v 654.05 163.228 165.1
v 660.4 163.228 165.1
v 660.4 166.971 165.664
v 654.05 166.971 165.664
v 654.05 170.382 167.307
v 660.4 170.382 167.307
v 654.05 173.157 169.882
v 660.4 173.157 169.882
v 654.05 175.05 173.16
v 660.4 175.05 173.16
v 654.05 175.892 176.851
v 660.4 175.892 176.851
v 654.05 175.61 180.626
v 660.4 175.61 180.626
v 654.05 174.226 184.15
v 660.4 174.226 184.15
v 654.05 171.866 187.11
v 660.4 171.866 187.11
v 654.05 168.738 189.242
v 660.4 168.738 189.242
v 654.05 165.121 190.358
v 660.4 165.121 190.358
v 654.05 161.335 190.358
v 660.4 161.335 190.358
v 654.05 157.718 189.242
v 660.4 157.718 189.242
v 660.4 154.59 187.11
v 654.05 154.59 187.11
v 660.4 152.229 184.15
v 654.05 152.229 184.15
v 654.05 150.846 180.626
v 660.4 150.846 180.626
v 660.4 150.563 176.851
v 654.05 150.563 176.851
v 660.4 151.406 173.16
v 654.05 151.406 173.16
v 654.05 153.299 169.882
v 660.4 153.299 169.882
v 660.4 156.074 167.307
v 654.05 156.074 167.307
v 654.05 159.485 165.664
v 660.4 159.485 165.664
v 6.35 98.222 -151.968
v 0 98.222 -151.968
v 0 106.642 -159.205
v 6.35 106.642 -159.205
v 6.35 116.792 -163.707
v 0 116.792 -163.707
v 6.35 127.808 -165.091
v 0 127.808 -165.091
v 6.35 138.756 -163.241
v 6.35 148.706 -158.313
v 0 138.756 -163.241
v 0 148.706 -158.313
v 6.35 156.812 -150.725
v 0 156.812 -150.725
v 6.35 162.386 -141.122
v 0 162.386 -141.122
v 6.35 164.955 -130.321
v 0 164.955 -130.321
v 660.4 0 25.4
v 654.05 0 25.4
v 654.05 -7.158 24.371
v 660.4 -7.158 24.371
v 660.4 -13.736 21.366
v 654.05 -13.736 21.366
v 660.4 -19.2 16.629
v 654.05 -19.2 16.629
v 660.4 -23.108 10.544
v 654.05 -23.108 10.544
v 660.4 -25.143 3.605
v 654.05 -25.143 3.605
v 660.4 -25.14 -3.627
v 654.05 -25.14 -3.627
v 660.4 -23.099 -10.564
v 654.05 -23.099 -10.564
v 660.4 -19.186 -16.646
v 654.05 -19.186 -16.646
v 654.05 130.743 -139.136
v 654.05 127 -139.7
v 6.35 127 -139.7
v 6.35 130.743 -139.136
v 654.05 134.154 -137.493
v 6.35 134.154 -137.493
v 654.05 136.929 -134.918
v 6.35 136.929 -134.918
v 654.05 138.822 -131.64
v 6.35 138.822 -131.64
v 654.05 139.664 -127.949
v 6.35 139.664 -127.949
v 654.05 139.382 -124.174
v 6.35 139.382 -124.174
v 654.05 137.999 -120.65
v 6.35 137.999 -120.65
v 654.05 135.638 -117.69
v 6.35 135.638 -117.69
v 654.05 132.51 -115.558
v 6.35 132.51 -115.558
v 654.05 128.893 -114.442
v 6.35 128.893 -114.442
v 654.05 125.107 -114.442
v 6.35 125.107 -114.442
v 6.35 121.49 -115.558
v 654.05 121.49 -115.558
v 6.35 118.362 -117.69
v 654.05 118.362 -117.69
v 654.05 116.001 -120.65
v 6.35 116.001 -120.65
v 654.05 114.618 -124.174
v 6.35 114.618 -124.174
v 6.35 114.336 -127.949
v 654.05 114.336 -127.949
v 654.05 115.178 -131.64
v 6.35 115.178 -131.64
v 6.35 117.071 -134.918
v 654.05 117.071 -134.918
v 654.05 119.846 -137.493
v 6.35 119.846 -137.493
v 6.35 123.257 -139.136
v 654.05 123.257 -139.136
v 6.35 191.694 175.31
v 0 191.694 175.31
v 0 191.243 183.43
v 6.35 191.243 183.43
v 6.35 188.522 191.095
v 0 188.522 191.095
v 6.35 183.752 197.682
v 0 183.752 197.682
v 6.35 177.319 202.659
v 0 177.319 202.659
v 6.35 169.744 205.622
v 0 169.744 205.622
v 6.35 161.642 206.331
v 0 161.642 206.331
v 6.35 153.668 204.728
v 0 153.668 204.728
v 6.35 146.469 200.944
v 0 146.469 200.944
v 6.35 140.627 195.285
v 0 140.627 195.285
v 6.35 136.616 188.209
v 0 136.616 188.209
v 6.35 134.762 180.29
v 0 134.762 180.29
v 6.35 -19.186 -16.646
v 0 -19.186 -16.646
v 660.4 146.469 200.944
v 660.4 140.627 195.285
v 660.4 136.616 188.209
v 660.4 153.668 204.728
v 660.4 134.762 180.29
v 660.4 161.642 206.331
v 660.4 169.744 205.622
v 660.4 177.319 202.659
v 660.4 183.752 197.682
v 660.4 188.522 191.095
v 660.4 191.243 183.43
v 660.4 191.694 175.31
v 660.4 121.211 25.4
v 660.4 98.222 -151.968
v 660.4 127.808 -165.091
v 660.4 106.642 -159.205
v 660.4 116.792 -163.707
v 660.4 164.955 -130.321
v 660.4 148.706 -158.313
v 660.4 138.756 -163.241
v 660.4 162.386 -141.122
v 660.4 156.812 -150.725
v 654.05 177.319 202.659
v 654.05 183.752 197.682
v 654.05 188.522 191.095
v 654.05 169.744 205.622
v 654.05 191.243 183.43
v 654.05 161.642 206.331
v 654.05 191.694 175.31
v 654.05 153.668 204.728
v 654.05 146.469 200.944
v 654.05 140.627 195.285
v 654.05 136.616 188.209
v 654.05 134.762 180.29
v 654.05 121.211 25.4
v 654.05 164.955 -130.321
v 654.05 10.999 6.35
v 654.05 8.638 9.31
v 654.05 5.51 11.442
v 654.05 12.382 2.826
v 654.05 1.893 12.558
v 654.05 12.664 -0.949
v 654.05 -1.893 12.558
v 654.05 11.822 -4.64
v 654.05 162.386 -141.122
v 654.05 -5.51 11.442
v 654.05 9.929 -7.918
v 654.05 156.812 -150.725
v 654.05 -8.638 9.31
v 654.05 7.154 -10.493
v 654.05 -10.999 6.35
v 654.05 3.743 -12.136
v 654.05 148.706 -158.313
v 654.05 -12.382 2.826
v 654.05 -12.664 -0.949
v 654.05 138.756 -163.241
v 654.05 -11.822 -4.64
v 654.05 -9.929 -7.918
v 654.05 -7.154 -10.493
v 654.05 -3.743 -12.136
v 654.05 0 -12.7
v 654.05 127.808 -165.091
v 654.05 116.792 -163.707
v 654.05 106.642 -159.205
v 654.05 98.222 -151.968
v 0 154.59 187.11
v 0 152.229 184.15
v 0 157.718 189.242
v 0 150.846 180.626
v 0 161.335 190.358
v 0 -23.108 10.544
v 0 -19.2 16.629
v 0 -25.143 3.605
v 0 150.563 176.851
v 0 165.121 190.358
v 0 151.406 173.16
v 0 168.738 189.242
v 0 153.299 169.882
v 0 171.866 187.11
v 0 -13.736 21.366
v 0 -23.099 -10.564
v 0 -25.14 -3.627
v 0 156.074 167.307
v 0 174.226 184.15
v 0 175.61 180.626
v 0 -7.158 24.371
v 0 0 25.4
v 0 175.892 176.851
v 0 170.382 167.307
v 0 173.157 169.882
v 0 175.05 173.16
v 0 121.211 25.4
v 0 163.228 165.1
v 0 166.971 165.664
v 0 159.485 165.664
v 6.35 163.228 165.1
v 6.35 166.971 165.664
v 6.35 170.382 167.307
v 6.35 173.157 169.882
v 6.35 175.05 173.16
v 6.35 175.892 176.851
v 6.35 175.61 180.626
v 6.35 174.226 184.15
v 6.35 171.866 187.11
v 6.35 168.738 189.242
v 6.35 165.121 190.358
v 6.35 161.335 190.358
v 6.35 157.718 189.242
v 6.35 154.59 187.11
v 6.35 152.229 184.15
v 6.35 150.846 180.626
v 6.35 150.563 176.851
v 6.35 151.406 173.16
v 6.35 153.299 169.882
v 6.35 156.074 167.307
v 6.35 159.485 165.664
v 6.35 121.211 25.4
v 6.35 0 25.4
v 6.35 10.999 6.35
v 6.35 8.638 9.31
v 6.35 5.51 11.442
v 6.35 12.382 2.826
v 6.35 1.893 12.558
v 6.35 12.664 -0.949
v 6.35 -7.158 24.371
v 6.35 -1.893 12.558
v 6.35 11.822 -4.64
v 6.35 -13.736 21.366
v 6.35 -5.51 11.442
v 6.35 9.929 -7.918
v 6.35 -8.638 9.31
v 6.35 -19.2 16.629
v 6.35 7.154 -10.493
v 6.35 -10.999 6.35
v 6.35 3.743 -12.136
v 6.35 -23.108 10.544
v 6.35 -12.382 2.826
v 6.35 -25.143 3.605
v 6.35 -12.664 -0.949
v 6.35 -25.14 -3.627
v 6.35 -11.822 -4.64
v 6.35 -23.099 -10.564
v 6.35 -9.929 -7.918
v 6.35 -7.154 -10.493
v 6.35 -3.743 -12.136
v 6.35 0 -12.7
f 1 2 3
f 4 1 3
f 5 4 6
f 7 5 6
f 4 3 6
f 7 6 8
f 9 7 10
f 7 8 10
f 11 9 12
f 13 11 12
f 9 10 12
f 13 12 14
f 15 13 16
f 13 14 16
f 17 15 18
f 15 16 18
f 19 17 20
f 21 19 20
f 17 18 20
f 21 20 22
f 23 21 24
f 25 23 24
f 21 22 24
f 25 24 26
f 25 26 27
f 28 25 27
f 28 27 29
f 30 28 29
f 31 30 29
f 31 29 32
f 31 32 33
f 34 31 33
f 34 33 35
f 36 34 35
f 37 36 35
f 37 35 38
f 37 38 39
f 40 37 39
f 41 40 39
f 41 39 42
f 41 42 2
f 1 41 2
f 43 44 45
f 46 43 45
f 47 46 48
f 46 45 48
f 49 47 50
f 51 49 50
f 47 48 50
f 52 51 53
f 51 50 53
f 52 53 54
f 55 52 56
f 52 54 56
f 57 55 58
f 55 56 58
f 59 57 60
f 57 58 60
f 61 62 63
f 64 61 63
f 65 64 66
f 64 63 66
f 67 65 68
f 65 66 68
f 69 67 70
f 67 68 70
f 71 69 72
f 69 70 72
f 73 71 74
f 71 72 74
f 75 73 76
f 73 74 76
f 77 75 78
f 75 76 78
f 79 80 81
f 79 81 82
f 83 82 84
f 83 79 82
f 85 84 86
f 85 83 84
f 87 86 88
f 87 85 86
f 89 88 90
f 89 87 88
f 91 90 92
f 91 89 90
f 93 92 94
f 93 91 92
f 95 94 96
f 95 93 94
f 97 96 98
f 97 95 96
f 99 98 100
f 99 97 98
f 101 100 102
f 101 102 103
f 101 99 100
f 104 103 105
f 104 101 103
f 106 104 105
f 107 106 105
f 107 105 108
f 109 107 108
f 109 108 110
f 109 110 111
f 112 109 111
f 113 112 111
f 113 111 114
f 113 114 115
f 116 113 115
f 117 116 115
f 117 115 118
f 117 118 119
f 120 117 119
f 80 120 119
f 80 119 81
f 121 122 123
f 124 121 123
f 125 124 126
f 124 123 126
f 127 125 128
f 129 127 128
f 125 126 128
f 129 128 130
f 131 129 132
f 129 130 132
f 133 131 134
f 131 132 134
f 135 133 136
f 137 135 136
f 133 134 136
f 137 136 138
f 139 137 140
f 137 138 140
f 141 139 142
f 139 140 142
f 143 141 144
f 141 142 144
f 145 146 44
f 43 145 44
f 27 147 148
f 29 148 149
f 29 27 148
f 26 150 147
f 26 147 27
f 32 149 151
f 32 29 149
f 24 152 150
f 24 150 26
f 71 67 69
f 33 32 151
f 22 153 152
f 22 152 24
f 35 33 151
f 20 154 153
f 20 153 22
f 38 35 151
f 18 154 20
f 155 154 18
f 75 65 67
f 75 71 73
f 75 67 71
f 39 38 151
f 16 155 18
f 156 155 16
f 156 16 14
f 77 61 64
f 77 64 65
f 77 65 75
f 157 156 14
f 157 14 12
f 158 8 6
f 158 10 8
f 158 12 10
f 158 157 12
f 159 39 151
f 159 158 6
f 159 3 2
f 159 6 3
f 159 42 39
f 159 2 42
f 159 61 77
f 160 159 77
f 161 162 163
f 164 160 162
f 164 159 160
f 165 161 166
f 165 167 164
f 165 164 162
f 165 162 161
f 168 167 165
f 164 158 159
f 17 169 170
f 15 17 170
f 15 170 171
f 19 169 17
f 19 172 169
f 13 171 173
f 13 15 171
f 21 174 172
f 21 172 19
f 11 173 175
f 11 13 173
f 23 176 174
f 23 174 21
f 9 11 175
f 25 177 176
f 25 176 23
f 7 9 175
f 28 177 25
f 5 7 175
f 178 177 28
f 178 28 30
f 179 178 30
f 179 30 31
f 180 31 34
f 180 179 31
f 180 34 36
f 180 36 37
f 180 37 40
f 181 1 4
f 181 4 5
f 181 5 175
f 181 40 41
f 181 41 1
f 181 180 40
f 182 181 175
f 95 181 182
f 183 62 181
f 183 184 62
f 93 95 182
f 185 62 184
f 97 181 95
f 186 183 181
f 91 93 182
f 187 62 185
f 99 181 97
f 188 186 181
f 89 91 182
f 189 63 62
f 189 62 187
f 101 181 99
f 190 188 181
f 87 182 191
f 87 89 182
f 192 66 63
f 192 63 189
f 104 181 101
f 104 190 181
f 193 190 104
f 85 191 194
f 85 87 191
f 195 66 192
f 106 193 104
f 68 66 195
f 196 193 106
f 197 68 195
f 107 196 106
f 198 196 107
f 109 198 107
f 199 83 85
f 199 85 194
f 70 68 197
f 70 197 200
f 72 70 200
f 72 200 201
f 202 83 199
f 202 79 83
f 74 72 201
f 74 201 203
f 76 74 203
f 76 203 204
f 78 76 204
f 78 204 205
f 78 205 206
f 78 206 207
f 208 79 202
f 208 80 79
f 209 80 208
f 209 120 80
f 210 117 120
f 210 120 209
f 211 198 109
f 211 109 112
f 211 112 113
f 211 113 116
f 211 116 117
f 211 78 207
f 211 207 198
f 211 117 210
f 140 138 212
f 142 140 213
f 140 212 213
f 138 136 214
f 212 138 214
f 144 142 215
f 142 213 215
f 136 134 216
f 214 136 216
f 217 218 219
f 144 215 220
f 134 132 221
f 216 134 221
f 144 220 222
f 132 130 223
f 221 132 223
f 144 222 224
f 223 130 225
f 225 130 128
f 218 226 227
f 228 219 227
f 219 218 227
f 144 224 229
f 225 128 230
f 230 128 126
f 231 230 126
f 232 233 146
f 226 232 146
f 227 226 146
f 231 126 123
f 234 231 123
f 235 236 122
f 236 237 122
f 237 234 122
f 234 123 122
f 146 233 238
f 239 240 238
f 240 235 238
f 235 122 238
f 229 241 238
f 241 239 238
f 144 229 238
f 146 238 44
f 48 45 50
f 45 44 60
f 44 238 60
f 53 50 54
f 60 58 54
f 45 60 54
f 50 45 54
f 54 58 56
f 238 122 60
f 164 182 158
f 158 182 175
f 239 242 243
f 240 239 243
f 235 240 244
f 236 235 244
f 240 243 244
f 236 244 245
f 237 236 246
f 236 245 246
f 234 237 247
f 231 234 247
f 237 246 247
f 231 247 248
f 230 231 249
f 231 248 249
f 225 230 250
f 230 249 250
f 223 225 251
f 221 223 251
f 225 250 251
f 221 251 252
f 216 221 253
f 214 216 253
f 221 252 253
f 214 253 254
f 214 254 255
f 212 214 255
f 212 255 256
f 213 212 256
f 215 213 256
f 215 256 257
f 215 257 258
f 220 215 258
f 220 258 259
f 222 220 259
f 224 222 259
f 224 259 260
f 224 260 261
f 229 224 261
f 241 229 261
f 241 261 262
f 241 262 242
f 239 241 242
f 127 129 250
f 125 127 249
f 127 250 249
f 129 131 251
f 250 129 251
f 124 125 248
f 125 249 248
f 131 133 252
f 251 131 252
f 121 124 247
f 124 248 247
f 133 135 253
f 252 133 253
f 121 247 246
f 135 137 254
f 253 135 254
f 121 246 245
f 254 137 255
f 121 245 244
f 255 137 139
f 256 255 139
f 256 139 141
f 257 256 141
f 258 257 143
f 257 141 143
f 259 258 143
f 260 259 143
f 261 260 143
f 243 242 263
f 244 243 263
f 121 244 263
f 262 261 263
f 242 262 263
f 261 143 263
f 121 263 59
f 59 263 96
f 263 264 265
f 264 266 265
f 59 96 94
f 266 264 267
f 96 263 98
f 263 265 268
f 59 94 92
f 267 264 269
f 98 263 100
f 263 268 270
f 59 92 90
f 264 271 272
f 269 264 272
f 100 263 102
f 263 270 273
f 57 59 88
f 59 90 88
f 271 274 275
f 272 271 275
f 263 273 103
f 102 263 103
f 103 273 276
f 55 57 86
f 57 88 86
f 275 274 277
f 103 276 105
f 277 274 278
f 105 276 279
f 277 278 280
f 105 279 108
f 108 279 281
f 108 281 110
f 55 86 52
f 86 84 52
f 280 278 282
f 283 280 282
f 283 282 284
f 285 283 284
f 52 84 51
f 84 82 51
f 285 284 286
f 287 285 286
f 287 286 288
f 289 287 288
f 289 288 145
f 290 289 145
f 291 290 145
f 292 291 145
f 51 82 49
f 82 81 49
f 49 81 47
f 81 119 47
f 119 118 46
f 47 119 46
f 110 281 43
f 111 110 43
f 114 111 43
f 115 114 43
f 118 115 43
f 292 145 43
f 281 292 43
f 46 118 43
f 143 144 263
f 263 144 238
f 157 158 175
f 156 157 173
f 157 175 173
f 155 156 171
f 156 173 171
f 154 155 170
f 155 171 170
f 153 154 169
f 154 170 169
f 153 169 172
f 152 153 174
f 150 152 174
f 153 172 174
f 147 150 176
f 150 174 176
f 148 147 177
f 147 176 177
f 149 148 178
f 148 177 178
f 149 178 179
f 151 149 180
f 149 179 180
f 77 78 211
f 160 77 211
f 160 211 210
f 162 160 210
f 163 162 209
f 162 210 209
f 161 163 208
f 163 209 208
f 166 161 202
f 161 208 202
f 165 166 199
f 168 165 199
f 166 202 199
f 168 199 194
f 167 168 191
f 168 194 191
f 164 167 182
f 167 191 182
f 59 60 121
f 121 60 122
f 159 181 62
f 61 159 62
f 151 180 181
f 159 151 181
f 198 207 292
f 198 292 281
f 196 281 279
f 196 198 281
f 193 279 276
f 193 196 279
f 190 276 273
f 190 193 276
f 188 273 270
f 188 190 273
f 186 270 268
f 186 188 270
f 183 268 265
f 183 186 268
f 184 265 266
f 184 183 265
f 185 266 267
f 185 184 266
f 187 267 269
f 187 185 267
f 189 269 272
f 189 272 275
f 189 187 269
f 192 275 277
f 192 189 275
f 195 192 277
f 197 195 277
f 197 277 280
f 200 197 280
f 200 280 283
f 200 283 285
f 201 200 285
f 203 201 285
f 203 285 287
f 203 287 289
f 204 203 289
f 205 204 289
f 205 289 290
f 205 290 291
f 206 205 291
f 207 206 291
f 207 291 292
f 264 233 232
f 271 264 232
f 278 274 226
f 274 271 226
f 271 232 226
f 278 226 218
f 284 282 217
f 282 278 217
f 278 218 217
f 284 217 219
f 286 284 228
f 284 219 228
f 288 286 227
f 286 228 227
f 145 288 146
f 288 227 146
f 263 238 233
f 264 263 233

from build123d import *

# Parameters (mm, degrees)
BOSS_EXTRUDE1_DEPTH     = 660.4
SKETCH2_W               = 647.7
SKETCH2_H               = 371.475
CUT_EXTRUDE1_DEPTH      = 192.802928595
CUT_EXTRUDE1_DEPTH_BACK = 26.4
BOSS_EXTRUDE2_REACH     = 662.4
SKETCH3_R               = 12.7
SKETCH4_R               = 12.7
CUT_EXTRUDE2_DEPTH      = 1
CUT_EXTRUDE2_DEPTH_BACK = 661.4


with BuildPart() as part:
    # Sketch1 → Boss-Extrude1 (new body)
    with BuildSketch(Plane(origin=(0, 0, 0), x_dir=(0, 0, -1), z_dir=(1, 0, 0))):
        with BuildLine():
            Line((-180.290475349, 134.761665097), (-25.4, 121.210504416))
            Line((-25.4, 121.210504416), (-25.4, 0))
            ThreePointArc((-25.4, 0), (-10.544261728, -23.107975779), (16.645554694, -19.185554694))
            Line((16.645554694, -19.185554694), (151.968332041, 98.221667959))
            ThreePointArc((151.968332041, 98.221667959), (163.240880217, 138.756215424), (130.320633799, 164.955017997))
            Line((130.320633799, 164.955017997), (-175.309524651, 191.694192093))
            ThreePointArc((-175.309524651, 191.694192093), (-206.266263498, 165.718403944), (-180.290475349, 134.761665097))
        make_face()
    extrude(amount=BOSS_EXTRUDE1_DEPTH)

    # Sketch2 → Cut-Extrude1 (cut, two sides)
    with BuildSketch(Plane(origin=(0, 0, 0), x_dir=(1, 0, 0), z_dir=(0, 1, 0))) as cut_extrude1_sk:
        with Locations((330.2, -20.6375)):
            Rectangle(SKETCH2_W, SKETCH2_H)
    extrude(amount=CUT_EXTRUDE1_DEPTH, mode=Mode.SUBTRACT)
    extrude(cut_extrude1_sk.sketch, amount=-CUT_EXTRUDE1_DEPTH_BACK, mode=Mode.SUBTRACT)

    # Sketch3 → Boss-Extrude2 (add, up to next)
    with BuildSketch(Plane(origin=(660.4, 0, 0), x_dir=(0, 0, -1), z_dir=(1, 0, 0)), mode=Mode.PRIVATE) as boss_extrude2_sk1:
        with Locations((127, 127)):
            Circle(SKETCH3_R)
    boss_extrude2_tool1 = extrude(boss_extrude2_sk1.sketch, amount=-BOSS_EXTRUDE2_REACH, mode=Mode.PRIVATE) - part.part
    add(boss_extrude2_tool1.solids().sort_by_distance((660.4, 127, -127))[0])
    # Sketch3 → Boss-Extrude2 (add, up to next)
    with BuildSketch(Plane(origin=(660.4, 0, 0), x_dir=(0, 0, -1), z_dir=(1, 0, 0)), mode=Mode.PRIVATE) as boss_extrude2_sk2:
        Circle(SKETCH3_R)
    boss_extrude2_tool2 = extrude(boss_extrude2_sk2.sketch, amount=-BOSS_EXTRUDE2_REACH, mode=Mode.PRIVATE) - part.part
    add(boss_extrude2_tool2.solids().sort_by_distance((660.4, 0, 0))[0])

    # Sketch4 → Cut-Extrude2 (cut, two sides)
    with BuildSketch(Plane(origin=(660.4, 0, 0), x_dir=(0, 0, -1), z_dir=(1, 0, 0))) as cut_extrude2_sk:
        with Locations((-177.8, 163.227928595)):
            Circle(SKETCH4_R)
    extrude(amount=CUT_EXTRUDE2_DEPTH, mode=Mode.SUBTRACT)
    extrude(cut_extrude2_sk.sketch, amount=-CUT_EXTRUDE2_DEPTH_BACK, mode=Mode.SUBTRACT)


solid = part.part
